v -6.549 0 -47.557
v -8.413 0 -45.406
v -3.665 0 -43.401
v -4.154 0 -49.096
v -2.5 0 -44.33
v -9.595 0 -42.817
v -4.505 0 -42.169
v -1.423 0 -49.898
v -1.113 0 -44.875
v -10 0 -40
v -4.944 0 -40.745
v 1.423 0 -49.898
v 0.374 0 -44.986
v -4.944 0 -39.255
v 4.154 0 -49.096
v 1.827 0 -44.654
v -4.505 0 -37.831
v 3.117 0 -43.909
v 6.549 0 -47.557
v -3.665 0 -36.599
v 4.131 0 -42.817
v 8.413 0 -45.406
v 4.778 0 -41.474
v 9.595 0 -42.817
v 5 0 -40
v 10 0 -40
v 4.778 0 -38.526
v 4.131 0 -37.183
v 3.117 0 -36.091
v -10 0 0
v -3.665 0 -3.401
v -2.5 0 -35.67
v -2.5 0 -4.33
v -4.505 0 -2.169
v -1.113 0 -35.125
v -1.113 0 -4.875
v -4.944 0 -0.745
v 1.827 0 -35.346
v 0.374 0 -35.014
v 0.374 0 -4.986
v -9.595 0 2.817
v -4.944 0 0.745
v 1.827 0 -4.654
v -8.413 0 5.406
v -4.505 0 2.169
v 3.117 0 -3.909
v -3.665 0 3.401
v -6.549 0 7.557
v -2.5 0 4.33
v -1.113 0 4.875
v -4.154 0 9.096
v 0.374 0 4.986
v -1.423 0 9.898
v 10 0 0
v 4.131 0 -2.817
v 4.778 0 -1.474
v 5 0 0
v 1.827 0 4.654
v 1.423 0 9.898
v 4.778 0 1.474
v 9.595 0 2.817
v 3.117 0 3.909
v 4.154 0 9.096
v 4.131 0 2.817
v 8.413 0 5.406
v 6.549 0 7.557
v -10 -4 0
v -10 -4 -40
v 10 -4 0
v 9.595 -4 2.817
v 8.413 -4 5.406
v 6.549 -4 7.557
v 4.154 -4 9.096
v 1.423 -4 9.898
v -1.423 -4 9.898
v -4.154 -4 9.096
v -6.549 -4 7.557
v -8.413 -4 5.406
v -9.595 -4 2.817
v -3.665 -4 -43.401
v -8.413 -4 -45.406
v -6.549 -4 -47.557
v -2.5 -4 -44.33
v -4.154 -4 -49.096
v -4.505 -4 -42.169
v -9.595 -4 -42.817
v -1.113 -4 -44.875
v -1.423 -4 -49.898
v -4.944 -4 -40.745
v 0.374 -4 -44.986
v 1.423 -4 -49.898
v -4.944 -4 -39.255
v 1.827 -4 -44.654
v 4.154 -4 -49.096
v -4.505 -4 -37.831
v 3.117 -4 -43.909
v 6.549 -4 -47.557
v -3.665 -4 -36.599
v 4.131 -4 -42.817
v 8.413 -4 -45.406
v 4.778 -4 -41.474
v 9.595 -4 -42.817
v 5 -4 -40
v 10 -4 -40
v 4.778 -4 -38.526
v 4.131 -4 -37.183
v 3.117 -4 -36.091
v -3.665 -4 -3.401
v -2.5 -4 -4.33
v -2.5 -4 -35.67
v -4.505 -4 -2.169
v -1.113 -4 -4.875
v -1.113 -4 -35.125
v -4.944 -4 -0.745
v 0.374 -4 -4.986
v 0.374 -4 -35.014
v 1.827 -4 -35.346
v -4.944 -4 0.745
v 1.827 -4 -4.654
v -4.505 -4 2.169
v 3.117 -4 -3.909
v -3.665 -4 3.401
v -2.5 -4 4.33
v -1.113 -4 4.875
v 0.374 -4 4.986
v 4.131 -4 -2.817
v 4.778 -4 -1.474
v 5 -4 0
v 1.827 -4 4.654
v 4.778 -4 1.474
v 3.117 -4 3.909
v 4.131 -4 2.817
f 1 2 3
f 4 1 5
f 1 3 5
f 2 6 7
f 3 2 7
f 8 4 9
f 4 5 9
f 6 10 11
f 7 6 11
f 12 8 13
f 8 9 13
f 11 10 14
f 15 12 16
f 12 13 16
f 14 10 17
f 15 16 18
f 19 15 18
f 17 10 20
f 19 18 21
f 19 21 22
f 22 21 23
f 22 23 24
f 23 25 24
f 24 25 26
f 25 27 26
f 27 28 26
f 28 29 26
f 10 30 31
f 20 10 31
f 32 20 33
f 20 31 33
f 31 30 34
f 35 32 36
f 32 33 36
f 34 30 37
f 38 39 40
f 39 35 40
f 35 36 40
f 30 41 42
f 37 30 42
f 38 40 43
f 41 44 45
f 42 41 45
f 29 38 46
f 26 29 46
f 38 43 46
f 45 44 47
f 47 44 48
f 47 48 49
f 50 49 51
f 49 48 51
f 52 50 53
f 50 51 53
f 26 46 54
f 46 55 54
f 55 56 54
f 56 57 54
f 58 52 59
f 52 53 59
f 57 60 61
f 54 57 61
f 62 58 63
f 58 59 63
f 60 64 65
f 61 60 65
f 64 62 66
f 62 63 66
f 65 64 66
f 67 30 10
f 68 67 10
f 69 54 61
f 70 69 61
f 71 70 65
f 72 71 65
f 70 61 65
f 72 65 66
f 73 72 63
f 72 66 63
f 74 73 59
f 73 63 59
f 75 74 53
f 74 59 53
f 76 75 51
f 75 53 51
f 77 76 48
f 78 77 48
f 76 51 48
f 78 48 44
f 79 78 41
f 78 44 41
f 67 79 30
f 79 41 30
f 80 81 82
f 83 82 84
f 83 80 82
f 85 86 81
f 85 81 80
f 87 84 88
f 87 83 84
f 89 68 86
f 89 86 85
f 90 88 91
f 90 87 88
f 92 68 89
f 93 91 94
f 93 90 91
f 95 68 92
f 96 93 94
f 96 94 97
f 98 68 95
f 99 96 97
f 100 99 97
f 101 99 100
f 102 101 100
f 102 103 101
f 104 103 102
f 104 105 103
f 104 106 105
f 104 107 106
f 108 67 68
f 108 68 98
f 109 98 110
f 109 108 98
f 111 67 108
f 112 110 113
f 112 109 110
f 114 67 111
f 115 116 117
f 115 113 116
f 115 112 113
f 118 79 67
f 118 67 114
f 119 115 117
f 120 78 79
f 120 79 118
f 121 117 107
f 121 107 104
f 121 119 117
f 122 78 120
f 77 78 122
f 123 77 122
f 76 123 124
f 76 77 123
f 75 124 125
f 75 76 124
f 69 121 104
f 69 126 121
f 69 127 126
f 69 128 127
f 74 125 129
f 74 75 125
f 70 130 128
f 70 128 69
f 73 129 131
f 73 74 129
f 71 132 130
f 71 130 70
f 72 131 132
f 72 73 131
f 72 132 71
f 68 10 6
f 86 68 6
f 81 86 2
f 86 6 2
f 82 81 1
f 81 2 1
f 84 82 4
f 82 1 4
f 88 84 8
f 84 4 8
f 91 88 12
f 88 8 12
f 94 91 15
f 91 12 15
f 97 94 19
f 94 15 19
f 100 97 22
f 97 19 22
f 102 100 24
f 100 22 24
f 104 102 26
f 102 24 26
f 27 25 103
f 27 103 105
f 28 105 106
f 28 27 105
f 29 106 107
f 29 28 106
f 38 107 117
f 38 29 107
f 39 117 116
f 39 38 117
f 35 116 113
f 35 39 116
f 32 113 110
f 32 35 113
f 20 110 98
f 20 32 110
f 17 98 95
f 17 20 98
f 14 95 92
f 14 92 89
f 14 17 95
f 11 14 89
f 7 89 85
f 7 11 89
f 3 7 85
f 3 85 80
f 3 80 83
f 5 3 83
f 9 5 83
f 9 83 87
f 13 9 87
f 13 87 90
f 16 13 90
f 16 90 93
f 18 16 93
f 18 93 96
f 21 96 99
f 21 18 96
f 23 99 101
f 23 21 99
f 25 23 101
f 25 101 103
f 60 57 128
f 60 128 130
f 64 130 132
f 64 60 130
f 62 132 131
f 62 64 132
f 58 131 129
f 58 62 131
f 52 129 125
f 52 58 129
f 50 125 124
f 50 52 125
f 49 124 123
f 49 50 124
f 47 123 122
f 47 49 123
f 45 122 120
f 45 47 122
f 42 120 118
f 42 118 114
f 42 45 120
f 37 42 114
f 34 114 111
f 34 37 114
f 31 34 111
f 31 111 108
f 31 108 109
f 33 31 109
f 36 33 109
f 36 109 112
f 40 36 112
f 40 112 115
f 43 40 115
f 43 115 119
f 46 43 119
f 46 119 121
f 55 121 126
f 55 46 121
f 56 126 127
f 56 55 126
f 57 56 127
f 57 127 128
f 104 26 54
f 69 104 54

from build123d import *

# Parameters (mm, degrees)
F0_R     = 5
F1_DEPTH = 4


with BuildPart() as f1:
    # F0 (on Front) → F1 (new body)
    with BuildSketch(Plane.XZ):
        with BuildLine():
            ThreePointArc((-10, 0), (0, -10), (10, 0))
            ThreePointArc((10, 0), (0, 10), (-10, 0))
        make_face()
        Circle(F0_R, mode=Mode.SUBTRACT)
        with BuildLine():
            Line((10, -40), (10, 0))
            ThreePointArc((10, 0), (0, -10), (-10, 0))
            Line((-10, 0), (-10, -40))
            ThreePointArc((-10, -40), (0, -30), (10, -40))
        make_face()
        with BuildLine():
            ThreePointArc((-10, -40), (0, -50), (10, -40))
            ThreePointArc((10, -40), (0, -30), (-10, -40))
        make_face()
        with Locations((0, -40)):
            Circle(F0_R, mode=Mode.SUBTRACT)
    extrude(amount=F1_DEPTH)


solid = f1.part
